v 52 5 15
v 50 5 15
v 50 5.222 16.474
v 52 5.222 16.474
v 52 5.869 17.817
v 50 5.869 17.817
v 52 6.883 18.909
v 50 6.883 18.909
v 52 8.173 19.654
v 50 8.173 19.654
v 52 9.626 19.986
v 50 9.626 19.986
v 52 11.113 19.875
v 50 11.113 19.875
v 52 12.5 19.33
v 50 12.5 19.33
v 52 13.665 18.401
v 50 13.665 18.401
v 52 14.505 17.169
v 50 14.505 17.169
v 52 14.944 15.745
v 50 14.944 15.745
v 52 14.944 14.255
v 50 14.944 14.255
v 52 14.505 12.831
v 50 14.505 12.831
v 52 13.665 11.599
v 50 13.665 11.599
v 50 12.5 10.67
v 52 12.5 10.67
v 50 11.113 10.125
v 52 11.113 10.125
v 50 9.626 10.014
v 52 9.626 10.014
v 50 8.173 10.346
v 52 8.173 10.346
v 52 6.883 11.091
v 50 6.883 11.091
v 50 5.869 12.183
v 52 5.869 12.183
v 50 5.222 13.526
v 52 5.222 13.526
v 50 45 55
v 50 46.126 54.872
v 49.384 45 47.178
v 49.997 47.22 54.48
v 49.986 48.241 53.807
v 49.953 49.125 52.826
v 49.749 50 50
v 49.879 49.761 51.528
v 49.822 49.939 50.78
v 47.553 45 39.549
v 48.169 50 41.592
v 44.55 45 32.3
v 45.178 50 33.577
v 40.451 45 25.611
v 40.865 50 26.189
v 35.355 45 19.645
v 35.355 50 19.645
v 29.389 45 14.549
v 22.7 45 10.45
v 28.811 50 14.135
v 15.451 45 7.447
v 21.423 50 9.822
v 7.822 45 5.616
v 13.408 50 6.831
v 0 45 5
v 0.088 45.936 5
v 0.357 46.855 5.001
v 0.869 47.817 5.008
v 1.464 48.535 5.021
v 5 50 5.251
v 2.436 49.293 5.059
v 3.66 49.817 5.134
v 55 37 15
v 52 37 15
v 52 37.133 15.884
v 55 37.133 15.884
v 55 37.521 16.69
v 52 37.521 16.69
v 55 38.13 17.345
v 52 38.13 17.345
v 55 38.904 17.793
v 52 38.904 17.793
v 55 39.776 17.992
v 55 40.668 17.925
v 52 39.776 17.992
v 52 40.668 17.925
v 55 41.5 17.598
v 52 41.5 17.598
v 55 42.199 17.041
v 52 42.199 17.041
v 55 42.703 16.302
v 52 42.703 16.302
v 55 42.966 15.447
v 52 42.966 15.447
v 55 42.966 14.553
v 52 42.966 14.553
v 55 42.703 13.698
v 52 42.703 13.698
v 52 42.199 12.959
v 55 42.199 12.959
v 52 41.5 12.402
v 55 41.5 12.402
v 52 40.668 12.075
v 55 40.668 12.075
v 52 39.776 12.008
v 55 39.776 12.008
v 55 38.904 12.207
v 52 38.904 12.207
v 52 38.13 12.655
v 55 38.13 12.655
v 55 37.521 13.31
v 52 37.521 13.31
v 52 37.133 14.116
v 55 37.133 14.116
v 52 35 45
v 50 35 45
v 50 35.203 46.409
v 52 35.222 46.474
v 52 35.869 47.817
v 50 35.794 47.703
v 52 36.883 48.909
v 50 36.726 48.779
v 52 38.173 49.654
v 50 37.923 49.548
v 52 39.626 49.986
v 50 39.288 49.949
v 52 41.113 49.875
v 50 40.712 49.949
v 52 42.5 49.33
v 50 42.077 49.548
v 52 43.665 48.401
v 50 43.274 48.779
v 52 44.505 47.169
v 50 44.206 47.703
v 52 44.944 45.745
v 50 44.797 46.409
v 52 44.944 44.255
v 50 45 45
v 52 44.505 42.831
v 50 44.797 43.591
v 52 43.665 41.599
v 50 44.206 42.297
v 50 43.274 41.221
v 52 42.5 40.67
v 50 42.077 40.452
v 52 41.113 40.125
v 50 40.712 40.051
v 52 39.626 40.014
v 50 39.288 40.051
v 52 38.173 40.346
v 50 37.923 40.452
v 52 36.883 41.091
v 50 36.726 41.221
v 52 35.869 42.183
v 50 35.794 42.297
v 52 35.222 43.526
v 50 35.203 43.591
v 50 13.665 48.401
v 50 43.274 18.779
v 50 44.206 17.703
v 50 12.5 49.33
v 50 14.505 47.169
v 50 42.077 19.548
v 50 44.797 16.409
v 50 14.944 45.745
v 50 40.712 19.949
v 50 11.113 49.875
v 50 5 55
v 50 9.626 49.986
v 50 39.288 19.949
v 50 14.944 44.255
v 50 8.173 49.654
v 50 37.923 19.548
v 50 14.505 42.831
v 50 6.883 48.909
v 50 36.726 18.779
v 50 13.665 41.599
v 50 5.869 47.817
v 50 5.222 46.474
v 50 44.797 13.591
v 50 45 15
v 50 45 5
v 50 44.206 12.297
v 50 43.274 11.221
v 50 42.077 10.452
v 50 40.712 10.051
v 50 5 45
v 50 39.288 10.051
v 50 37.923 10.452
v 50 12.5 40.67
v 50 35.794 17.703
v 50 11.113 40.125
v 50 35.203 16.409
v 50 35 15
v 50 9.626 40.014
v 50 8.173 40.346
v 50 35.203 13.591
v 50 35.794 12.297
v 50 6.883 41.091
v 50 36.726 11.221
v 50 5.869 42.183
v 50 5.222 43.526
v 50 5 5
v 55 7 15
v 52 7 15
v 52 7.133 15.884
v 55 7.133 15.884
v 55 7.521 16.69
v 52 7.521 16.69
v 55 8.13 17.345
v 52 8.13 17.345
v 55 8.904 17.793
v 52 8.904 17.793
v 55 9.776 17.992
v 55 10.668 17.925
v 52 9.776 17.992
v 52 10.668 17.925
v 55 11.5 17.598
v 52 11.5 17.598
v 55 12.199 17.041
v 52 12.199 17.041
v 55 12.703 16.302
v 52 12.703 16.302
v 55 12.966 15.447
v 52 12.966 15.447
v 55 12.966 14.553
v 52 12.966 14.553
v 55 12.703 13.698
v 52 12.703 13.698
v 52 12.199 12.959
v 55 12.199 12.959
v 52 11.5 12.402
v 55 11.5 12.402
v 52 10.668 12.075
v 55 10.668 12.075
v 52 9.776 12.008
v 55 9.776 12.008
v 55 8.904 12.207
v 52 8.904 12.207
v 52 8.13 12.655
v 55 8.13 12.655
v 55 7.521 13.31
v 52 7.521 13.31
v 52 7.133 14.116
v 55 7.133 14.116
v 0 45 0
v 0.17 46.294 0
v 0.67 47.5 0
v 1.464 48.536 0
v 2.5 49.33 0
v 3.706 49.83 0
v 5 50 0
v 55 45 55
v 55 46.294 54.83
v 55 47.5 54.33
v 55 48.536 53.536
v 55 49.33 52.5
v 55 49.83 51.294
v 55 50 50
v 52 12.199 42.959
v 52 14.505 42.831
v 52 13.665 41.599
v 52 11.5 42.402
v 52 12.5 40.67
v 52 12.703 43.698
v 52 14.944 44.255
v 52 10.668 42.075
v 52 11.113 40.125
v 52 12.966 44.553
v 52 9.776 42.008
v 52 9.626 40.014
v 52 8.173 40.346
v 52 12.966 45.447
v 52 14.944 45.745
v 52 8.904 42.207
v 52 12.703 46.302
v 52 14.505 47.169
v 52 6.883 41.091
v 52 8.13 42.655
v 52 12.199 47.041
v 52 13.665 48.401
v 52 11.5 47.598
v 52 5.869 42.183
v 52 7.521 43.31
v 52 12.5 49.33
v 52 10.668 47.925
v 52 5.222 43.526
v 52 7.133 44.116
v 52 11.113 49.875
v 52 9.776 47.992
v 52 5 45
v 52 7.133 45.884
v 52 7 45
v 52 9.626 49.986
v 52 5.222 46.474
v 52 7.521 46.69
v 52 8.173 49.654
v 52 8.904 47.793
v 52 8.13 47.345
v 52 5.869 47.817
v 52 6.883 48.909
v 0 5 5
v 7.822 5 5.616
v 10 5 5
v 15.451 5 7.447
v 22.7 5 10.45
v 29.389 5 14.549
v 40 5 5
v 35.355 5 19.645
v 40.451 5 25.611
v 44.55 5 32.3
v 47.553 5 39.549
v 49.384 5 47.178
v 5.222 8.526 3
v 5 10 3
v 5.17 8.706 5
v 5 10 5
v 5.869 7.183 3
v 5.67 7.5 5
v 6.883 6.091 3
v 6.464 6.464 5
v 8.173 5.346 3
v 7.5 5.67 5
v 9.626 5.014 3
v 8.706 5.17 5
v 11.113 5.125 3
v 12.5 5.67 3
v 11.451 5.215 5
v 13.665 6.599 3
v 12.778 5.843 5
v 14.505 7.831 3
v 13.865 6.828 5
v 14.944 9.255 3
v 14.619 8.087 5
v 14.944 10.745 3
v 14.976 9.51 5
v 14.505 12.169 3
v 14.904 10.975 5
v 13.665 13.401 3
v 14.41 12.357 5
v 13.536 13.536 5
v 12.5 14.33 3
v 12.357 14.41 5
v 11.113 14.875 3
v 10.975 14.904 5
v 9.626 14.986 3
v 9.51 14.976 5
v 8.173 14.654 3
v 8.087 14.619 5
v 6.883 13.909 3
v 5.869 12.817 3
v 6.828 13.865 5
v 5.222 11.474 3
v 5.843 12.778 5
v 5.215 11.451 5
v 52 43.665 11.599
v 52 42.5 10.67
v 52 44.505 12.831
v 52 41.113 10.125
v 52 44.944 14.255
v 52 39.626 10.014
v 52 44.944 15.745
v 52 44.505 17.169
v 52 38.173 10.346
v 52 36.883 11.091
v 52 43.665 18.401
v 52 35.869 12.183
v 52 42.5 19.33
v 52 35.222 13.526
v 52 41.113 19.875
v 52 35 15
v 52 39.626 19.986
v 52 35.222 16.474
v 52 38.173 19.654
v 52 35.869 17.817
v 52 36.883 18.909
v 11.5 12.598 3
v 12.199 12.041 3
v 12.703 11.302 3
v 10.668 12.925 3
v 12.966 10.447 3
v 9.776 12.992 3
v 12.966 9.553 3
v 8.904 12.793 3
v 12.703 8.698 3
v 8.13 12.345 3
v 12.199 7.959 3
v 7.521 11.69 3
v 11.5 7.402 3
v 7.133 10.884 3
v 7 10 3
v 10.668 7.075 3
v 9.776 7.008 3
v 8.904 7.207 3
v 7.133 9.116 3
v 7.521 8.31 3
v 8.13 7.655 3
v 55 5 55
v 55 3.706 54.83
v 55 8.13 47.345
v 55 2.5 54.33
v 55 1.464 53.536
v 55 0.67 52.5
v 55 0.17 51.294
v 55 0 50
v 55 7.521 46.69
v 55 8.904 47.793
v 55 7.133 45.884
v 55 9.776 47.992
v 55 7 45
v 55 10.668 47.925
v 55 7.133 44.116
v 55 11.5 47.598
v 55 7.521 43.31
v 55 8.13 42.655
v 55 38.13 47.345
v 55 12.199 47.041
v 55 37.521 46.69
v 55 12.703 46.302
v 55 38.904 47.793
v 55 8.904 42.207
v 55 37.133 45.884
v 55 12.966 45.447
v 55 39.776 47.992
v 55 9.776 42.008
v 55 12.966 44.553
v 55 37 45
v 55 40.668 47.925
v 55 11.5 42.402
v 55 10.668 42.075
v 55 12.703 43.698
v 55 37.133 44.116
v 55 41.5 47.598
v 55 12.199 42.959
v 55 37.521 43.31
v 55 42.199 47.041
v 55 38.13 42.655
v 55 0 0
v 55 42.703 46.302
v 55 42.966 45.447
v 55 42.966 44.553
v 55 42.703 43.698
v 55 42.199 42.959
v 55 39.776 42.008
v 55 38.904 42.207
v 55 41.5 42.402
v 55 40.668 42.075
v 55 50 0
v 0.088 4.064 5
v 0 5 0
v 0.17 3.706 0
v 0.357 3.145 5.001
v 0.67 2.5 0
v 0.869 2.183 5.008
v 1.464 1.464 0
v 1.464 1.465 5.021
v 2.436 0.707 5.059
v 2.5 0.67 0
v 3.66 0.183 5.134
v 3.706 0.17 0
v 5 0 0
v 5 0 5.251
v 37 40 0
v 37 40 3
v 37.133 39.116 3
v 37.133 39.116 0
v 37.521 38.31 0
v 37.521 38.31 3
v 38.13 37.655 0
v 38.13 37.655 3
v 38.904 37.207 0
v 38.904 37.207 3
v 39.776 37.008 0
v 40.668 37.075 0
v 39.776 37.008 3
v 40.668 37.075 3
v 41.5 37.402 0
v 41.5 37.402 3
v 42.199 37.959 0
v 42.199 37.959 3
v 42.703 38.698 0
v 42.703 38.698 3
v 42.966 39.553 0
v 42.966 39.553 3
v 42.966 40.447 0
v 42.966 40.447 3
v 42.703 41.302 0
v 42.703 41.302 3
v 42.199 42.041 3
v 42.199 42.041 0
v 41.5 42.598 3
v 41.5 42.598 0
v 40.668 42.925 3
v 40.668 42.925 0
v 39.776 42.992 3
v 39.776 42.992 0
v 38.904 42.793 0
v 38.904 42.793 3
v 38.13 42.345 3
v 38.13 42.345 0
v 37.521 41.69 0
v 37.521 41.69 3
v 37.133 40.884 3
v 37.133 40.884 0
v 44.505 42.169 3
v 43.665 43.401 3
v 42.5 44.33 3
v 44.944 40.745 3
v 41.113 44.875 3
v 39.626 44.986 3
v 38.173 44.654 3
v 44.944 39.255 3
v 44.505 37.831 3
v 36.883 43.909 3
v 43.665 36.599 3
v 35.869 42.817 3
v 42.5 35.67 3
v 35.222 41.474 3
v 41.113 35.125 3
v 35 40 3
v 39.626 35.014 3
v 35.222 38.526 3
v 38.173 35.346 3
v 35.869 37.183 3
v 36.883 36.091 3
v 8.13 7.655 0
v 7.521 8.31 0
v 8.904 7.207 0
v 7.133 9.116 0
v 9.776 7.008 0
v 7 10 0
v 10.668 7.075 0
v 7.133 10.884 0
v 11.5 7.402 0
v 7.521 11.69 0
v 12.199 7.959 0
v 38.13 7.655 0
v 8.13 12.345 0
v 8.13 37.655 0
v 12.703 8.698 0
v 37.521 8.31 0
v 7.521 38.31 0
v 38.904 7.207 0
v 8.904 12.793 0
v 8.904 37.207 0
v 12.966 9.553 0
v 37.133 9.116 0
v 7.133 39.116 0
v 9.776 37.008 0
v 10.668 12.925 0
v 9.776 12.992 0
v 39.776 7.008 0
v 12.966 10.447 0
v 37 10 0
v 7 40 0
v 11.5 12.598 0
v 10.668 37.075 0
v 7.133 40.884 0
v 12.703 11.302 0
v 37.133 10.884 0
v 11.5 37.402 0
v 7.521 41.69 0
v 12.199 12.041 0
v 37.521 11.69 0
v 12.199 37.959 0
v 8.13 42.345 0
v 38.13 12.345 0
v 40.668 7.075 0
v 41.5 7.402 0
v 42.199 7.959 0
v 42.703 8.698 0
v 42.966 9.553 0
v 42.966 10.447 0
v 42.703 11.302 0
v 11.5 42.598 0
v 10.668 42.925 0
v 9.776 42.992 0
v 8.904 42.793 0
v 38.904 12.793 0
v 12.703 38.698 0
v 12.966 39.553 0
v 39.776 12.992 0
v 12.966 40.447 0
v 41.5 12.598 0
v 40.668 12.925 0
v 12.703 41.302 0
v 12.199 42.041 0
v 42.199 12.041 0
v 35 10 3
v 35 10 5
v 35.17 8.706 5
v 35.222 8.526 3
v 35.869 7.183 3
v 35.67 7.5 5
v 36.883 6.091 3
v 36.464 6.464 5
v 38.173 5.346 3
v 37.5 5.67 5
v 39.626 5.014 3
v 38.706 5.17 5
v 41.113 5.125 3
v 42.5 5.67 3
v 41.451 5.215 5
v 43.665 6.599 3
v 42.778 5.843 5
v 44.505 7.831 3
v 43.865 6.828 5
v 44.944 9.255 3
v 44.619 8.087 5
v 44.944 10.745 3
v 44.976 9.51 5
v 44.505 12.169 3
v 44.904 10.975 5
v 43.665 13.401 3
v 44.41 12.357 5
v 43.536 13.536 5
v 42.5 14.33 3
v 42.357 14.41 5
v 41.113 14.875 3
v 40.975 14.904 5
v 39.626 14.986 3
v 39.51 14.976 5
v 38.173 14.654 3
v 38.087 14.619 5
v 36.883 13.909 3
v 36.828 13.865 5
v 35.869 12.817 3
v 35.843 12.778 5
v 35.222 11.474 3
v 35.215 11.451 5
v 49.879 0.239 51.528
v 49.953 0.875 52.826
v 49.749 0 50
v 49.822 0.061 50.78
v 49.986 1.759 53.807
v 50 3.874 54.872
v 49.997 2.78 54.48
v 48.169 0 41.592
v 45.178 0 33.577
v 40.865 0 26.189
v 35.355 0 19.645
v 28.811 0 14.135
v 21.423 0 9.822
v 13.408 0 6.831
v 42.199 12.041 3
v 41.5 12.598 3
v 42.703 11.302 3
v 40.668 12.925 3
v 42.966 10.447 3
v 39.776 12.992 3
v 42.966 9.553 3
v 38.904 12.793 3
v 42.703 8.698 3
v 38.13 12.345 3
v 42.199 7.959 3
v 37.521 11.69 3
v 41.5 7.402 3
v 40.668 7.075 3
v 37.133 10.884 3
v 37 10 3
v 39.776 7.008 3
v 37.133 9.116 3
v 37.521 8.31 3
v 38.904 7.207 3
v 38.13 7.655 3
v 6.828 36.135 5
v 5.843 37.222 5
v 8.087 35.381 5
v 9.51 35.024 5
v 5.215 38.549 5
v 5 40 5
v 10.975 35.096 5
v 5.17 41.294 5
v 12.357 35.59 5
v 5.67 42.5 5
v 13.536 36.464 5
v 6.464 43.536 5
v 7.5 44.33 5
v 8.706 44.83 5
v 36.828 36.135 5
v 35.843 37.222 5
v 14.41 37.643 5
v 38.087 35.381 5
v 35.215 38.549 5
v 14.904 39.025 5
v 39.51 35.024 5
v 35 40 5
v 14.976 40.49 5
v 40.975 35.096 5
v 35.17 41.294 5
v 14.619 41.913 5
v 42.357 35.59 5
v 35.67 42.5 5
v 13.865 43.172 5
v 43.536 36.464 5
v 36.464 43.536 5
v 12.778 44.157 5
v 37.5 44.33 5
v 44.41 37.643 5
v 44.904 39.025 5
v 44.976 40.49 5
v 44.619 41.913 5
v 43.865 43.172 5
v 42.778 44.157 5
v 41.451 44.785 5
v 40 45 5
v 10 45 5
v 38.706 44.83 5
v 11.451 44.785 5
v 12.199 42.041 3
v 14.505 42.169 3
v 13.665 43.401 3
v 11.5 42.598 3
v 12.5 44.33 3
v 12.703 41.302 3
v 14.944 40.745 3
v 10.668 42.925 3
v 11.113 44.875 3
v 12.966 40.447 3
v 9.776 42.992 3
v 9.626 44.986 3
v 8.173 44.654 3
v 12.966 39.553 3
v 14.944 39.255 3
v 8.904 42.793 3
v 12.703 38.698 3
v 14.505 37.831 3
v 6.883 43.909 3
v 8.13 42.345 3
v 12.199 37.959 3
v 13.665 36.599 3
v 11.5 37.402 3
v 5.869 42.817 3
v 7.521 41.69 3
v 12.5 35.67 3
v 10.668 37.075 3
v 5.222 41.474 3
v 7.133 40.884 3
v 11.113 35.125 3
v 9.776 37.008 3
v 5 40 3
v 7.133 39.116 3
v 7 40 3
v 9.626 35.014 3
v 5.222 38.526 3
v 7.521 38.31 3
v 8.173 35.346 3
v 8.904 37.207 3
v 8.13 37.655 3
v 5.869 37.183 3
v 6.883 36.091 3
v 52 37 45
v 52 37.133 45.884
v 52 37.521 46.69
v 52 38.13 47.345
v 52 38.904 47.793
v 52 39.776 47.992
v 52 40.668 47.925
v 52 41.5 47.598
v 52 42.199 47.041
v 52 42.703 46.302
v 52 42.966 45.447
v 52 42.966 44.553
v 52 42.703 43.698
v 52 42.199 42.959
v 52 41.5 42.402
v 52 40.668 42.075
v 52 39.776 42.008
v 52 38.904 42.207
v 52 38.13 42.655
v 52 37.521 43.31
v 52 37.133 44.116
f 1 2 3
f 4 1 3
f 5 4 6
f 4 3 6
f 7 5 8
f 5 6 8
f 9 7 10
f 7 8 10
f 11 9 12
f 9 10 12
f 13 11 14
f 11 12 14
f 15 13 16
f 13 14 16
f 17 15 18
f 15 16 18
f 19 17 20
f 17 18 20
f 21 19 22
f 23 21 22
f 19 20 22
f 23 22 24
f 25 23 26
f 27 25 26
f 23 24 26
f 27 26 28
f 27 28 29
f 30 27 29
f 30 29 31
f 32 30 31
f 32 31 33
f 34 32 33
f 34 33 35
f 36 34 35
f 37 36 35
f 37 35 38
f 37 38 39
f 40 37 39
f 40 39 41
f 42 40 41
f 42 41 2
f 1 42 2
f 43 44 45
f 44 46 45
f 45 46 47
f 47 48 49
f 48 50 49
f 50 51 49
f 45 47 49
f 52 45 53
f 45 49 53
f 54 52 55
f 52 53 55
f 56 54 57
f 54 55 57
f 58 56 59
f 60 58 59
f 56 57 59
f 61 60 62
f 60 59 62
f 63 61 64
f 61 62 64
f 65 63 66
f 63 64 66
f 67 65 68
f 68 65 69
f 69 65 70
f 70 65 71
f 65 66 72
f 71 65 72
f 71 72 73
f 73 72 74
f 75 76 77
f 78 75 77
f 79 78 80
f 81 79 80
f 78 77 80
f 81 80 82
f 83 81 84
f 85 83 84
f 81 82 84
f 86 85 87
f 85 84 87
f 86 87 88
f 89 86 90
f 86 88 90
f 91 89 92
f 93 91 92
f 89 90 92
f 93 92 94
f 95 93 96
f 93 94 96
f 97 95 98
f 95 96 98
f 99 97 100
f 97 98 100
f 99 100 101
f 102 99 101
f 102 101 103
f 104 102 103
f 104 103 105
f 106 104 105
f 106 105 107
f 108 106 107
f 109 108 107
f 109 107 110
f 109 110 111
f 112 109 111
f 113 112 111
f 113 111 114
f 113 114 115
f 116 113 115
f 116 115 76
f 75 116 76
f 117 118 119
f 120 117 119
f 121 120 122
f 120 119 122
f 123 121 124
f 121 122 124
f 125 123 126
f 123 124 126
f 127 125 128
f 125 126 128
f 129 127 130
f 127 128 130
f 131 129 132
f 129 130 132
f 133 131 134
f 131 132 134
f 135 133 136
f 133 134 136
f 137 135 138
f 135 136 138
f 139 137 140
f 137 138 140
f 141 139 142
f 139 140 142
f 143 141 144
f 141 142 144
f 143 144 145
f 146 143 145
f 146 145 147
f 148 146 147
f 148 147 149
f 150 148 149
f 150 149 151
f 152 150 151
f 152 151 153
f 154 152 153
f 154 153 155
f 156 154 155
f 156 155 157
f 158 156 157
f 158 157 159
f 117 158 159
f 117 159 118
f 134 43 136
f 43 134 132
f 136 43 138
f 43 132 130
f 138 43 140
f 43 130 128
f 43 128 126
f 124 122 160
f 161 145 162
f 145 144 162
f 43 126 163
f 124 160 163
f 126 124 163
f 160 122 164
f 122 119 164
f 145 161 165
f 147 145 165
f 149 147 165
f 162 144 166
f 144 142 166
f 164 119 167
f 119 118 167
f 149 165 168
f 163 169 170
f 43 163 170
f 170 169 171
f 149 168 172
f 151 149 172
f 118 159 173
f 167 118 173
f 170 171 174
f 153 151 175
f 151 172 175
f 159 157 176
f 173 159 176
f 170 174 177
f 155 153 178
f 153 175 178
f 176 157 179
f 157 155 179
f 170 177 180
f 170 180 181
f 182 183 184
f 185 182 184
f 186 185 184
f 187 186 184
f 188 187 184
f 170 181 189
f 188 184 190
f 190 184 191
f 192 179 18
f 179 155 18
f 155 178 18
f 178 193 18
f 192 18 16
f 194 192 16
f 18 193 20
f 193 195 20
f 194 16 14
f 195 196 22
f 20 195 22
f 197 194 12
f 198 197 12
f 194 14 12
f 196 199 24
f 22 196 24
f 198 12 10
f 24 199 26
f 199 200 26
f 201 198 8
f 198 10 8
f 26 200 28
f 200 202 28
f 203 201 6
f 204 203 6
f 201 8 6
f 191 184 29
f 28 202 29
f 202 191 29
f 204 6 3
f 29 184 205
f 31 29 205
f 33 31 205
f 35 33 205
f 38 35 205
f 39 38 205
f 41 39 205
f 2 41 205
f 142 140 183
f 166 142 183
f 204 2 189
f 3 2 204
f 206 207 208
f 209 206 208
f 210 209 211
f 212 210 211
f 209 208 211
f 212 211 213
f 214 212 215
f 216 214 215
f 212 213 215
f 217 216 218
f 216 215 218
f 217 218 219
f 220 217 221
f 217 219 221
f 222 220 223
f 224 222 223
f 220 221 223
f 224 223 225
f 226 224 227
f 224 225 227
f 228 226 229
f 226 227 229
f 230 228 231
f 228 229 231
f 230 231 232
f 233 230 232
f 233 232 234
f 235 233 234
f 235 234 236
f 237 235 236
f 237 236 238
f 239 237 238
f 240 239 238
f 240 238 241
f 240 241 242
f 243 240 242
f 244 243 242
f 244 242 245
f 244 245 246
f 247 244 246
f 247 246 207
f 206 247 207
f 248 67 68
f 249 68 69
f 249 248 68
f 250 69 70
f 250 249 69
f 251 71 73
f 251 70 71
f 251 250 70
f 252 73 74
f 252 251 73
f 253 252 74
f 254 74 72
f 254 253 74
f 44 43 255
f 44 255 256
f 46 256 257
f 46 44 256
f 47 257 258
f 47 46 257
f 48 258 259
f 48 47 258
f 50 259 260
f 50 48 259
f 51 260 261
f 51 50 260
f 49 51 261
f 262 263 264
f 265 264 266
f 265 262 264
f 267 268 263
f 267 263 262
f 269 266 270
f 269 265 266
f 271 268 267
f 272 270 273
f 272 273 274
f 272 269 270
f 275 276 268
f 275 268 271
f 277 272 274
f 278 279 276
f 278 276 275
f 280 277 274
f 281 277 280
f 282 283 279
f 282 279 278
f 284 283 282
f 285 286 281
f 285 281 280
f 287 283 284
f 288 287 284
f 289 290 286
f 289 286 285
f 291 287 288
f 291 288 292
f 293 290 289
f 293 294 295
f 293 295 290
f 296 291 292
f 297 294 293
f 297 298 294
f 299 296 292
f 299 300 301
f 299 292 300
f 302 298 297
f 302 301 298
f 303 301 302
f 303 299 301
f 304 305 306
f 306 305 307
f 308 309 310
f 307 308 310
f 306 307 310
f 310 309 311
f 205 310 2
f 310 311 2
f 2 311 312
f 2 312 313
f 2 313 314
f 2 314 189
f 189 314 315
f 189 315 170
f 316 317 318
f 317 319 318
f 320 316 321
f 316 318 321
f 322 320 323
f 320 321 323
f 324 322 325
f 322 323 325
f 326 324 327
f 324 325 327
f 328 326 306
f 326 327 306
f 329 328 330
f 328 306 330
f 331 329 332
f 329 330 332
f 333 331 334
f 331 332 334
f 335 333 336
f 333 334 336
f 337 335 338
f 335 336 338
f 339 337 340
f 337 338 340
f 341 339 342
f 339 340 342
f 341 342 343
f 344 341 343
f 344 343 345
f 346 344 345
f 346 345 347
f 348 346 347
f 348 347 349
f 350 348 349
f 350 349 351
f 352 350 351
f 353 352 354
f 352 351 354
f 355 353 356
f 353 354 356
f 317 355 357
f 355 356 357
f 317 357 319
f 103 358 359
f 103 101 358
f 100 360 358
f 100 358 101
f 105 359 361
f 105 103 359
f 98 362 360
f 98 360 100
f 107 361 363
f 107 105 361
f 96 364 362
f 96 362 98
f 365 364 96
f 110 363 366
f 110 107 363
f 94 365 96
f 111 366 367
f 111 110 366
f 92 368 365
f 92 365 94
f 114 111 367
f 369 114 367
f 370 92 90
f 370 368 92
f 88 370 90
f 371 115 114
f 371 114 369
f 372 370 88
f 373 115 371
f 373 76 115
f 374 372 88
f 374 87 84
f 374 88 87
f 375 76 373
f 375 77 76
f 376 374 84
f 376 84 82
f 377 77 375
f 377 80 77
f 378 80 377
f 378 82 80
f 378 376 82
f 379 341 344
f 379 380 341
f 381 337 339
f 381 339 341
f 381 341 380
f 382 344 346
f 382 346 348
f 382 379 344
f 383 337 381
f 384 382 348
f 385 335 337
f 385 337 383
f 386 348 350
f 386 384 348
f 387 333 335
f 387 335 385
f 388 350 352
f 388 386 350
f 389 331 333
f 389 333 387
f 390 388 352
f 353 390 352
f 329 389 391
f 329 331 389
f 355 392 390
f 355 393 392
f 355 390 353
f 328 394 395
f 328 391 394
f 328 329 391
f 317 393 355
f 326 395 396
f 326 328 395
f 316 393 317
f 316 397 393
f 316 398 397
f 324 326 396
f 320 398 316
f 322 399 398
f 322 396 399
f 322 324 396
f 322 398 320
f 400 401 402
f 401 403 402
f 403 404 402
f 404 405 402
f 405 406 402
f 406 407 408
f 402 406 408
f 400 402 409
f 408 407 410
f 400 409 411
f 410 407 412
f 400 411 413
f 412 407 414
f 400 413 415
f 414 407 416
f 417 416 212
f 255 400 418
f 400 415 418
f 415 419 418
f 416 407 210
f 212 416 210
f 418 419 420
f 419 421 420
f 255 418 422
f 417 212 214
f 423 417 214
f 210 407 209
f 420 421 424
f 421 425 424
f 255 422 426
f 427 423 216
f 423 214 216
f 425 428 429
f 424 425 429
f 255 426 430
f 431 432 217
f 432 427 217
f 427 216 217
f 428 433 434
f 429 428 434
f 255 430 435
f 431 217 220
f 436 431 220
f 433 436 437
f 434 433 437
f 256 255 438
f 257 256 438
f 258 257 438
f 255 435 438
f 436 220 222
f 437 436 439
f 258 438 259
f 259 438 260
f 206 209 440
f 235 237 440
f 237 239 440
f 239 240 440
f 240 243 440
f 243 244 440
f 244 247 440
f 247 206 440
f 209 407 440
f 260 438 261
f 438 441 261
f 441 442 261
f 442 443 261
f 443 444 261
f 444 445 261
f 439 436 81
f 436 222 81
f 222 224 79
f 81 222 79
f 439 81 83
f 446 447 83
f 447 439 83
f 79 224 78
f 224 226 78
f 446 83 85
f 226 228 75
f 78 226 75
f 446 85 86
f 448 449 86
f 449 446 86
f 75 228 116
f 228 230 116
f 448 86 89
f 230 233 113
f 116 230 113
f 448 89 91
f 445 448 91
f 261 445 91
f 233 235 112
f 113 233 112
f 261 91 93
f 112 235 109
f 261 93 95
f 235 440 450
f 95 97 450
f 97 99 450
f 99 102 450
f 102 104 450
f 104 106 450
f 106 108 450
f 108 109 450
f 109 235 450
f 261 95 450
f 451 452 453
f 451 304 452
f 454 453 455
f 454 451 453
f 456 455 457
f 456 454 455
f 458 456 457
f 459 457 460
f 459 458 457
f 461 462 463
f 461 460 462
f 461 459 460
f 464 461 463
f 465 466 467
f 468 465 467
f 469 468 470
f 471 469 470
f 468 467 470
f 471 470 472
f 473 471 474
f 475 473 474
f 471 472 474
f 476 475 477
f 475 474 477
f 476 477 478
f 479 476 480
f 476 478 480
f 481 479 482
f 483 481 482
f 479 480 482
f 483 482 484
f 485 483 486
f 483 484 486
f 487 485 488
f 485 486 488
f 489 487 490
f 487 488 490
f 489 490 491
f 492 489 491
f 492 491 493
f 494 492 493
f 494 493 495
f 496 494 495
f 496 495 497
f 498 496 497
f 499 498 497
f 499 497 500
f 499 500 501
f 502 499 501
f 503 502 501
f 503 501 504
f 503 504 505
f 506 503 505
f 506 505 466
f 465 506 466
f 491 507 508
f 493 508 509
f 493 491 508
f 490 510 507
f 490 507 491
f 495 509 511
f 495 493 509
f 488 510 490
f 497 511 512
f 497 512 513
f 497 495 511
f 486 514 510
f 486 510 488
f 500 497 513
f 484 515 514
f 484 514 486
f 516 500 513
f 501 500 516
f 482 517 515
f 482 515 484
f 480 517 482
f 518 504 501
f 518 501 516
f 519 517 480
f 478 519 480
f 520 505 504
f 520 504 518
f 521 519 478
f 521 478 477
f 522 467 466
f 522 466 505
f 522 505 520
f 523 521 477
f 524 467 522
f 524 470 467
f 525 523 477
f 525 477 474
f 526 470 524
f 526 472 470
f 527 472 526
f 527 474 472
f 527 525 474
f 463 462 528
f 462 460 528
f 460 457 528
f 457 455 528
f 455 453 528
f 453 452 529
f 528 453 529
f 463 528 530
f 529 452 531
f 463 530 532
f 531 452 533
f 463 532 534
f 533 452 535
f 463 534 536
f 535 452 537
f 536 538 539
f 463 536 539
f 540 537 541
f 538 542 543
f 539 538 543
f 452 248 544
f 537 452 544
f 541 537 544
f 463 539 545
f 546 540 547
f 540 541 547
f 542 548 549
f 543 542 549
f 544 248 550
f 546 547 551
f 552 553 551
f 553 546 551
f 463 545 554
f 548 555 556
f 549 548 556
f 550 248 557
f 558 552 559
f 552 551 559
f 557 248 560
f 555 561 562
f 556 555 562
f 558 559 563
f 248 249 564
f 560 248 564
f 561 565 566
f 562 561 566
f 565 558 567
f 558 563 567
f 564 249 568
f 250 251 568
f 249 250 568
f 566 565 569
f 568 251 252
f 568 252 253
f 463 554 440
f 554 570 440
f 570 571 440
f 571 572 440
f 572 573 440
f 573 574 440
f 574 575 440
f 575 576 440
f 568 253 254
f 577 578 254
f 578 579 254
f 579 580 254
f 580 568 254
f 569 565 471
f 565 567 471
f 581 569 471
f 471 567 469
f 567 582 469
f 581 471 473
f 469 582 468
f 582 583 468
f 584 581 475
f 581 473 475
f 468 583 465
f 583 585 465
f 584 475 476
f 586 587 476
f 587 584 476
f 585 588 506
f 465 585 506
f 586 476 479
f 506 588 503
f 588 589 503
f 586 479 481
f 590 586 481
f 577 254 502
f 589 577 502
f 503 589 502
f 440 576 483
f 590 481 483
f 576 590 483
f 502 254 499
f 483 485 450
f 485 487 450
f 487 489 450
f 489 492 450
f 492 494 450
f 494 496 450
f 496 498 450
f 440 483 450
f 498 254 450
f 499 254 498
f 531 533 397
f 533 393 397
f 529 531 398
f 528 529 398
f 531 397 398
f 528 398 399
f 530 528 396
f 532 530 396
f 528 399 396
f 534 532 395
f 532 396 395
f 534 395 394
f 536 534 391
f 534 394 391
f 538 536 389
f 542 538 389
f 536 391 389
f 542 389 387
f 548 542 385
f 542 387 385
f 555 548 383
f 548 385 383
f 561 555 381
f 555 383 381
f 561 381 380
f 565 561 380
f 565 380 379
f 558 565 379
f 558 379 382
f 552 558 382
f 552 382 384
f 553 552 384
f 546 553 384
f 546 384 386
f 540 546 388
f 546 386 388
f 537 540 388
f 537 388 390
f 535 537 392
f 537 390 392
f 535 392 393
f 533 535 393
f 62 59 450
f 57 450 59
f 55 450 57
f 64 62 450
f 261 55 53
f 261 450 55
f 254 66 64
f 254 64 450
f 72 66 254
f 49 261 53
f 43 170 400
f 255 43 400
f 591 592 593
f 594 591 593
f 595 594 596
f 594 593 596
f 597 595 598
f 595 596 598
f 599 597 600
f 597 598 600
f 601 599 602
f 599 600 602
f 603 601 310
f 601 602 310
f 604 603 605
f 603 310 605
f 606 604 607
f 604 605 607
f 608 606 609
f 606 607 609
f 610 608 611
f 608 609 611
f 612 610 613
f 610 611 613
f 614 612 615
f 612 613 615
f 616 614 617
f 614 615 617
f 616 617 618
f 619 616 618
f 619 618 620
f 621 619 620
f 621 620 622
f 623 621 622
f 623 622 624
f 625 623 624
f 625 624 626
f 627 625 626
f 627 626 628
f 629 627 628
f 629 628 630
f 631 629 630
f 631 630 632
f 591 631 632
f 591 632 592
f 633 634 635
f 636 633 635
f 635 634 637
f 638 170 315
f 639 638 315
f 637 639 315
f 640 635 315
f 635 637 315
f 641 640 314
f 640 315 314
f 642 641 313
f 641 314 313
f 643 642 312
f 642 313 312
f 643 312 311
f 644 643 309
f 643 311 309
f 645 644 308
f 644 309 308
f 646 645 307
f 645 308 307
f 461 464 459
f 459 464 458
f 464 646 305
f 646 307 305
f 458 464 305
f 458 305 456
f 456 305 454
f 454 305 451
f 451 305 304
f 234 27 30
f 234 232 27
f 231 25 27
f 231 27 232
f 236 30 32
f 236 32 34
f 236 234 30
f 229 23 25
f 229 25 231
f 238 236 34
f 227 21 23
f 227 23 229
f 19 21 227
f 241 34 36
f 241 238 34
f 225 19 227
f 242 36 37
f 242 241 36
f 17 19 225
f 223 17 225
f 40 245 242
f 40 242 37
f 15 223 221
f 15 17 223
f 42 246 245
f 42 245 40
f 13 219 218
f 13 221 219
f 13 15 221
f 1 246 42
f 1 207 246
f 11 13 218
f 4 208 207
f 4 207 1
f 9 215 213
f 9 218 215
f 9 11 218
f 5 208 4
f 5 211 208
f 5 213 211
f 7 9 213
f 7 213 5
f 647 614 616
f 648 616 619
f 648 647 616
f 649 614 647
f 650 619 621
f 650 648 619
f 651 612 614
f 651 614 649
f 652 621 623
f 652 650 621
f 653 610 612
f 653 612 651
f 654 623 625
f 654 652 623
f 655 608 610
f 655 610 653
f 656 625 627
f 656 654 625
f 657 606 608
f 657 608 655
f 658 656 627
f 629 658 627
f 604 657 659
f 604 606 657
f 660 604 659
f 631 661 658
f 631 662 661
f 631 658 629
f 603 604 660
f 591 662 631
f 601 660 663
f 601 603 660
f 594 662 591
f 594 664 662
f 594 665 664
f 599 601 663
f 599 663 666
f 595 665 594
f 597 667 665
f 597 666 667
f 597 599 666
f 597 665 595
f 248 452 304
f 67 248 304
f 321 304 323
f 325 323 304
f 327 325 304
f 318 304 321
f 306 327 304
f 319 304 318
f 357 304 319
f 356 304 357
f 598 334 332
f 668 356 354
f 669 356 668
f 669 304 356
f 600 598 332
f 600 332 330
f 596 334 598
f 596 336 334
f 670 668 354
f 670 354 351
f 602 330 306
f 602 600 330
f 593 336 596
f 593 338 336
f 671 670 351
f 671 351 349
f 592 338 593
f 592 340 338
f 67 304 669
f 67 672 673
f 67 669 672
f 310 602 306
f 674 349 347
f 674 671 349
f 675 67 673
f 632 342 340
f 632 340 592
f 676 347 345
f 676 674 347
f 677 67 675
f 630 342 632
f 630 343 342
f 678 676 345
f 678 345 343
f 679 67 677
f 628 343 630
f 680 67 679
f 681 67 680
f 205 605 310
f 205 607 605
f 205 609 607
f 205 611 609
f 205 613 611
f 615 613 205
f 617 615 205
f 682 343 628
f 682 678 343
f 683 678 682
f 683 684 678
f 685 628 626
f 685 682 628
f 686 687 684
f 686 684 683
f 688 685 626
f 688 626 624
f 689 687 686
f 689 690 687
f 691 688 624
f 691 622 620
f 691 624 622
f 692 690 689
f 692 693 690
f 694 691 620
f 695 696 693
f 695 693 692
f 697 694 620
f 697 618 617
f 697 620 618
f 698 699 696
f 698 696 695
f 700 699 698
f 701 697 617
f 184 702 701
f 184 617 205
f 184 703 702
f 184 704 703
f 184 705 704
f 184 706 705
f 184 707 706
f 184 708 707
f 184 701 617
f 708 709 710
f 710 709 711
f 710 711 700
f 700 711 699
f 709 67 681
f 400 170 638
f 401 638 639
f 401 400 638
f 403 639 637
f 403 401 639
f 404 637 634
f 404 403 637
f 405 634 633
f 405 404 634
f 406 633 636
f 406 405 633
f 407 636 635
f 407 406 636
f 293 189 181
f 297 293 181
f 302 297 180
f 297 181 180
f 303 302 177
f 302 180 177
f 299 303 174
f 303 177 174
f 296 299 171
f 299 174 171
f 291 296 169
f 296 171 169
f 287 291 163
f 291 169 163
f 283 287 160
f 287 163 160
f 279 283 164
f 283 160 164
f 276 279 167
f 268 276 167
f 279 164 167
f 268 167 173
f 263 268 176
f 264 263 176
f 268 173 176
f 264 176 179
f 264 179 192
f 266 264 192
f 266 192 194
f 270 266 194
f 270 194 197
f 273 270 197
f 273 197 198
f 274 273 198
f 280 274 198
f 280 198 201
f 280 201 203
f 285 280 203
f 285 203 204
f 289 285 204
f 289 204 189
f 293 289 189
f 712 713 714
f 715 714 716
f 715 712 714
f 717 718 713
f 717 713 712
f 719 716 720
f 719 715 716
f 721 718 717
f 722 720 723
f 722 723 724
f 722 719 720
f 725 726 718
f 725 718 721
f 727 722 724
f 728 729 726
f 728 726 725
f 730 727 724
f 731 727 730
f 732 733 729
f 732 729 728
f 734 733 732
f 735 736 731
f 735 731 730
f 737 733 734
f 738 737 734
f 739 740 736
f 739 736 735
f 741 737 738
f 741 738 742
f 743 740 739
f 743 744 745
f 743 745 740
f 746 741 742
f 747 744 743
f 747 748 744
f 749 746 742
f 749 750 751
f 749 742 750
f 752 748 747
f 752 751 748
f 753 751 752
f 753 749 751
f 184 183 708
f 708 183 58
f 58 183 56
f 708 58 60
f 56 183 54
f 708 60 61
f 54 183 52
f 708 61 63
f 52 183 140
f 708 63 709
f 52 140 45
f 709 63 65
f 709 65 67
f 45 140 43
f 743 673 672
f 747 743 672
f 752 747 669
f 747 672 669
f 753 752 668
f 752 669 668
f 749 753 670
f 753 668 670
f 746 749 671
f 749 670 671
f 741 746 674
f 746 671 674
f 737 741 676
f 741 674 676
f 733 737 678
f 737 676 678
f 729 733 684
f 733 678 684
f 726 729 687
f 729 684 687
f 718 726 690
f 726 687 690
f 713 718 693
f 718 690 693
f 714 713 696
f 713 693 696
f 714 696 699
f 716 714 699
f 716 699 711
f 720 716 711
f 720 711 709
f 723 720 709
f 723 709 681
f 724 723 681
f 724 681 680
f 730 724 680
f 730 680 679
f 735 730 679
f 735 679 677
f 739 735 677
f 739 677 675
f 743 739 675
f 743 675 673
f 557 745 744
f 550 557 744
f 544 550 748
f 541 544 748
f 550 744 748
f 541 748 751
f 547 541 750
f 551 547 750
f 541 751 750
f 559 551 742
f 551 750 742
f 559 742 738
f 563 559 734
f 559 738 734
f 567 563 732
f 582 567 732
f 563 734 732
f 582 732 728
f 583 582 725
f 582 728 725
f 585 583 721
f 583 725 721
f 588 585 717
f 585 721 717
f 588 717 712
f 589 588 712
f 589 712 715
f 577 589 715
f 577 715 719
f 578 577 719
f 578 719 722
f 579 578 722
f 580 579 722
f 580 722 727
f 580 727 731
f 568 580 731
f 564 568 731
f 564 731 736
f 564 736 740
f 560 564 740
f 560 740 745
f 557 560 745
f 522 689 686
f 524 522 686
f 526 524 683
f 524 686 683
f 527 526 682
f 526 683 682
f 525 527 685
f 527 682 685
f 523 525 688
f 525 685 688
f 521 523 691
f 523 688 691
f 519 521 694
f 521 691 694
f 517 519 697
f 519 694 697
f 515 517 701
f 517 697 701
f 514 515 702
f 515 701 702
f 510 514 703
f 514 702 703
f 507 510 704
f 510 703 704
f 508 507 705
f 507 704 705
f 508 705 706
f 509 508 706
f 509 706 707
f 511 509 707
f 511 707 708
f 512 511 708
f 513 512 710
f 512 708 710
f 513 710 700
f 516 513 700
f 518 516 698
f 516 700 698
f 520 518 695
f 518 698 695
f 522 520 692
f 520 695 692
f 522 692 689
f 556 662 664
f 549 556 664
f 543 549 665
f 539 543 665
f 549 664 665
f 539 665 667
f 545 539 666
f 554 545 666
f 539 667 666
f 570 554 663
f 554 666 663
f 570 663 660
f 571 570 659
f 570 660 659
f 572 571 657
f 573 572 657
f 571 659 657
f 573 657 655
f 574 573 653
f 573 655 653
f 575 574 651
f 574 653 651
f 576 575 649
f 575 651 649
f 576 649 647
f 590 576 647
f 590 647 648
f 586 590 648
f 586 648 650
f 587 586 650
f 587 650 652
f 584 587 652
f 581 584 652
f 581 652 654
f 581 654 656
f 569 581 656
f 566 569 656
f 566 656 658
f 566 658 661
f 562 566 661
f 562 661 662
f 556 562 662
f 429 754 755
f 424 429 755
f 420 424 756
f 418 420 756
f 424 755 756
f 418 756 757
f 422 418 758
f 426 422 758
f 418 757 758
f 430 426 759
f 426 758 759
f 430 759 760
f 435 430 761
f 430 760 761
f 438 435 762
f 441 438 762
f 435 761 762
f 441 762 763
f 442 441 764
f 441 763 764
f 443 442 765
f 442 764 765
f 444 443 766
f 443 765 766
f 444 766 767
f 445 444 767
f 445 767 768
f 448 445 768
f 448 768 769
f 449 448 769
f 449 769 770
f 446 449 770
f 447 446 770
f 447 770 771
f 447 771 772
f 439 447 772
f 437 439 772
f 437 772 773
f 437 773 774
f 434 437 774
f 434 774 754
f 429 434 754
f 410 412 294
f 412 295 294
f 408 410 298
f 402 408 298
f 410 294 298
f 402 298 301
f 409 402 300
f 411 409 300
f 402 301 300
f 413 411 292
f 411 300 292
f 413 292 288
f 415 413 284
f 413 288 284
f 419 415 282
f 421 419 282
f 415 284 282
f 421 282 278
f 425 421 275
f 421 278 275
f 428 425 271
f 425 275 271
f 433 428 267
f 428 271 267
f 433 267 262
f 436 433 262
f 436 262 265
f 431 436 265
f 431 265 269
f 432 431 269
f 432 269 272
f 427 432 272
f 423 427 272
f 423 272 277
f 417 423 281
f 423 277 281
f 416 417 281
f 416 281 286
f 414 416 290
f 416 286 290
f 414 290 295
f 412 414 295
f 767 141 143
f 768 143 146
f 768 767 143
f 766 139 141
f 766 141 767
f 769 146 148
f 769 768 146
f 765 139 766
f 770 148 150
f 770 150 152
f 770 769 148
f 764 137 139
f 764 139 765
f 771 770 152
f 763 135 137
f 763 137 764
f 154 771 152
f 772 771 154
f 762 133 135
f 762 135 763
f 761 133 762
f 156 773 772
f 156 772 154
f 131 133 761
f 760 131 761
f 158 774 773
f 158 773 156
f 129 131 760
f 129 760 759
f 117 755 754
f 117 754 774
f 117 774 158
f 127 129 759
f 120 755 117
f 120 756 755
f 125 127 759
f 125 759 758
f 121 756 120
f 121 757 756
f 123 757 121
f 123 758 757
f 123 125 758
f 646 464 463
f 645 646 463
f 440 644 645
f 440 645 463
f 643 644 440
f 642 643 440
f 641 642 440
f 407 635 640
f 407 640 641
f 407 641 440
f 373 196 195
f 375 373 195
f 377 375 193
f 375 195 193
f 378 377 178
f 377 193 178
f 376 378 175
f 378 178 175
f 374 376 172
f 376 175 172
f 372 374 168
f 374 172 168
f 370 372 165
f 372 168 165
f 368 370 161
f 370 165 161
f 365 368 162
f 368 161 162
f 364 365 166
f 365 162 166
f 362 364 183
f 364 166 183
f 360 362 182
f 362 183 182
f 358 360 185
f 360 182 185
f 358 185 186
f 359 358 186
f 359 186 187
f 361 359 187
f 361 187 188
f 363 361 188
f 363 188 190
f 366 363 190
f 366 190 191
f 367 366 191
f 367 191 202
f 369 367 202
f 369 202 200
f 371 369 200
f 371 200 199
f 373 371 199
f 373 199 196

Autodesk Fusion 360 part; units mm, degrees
sketch "Sketch1" plane through (0, 0, 0) normal (0, 0, 1) x (1, 0, 0)
  line L0 (0, 0) -> (55, 0)
  line L1 (55, 0) -> (55, 50)
  line L2 (55, 50) -> (0, 50)
  line L3 (0, 50) -> (0, 0)
  dimension "d1" = 55
  dimension "d2" = 50
extrude "Extrude1" add sketch "Sketch1" along normal blind 5
sketch "Sketch2" plane through (0, 0, 5) normal (0, 0, 1) x (-1, 0, 0)
  line L0 (0, -50) -> (0, 0)
  line L1 (0, 0) -> (-55, 0)
  line L2 (-55, 0) -> (-55, -50)
  line L3 (-55, -50) -> (0, -50)
  circle A0 centre (-10, -40) radius 3
  circle A1 centre (-10, -10) radius 3
  circle A2 centre (-40, -10) radius 3
  circle A3 centre (-40, -40) radius 3
  dimension "d5" = 6
  dimension "d6" = 6
  dimension "d7" = 6
  dimension "d8" = 6
extrude "Extrude2" cut sketch "Sketch2" against normal blind 5 contours A0 | A1 | A2 | A3
sketch "Sketch3" plane through (0, 0, 5) normal (0, 0, 1) x (-1, 0, 0)
  circle A0 centre (-40, -40) radius 3
  circle A1 centre (-40, -10) radius 3
  circle A2 centre (-10, -40) radius 3
  circle A3 centre (-10, -10) radius 3
  line L0 (0, -50) -> (0, 0)
  line L1 (0, 0) -> (-55, 0)
  line L2 (-55, 0) -> (-55, -50)
  line L3 (-55, -50) -> (0, -50)
  circle A4 centre (-10, -10) radius 5
  circle A5 centre (-10, -40) radius 5
  circle A6 centre (-40, -40) radius 5
  circle A7 centre (-40, -10) radius 5
  dimension "d11" = 10
  dimension "d12" = 10
  dimension "d13" = 10
  dimension "d14" = 10
extrude "Extrude3" cut sketch "Sketch3" against normal blind 2 contours A4 | A5 | A6 | A7
sketch "Sketch4" plane through (0, 0, 5) normal (0, 0, 1) x (-1, 0, 0)
  circle A0 centre (-40, -40) radius 5
  circle A1 centre (-40, -10) radius 5
  circle A2 centre (-10, -40) radius 5
  circle A3 centre (-10, -10) radius 5
  line L0 (0, -50) -> (0, 0)
  line L1 (0, 0) -> (-55, 0)
  line L2 (-55, 0) -> (-55, -50)
  line L3 (-55, -50) -> (0, -50)
  line L4 (-50, 0) -> (-55, 0)
  line L5 (-55, 0) -> (-55, -50)
  line L6 (-55, -50) -> (-50, -50)
  line L7 (-50, -50) -> (-50, 0)
  dimension "d17" = 5
  dimension "d18" = 50
extrude "Extrude4" add sketch "Sketch4" along normal blind 50 contours L1 L2 L3 L4 L5 L6 L7
sketch "Sketch5" plane through (50, 0, 0) normal (-1, 0, 0) x (0, -1, 0)
  line L0 (-50, 5) -> (0, 5)
  line L1 (0, 5) -> (0, 55)
  line L2 (0, 55) -> (-50, 55)
  line L3 (-50, 55) -> (-50, 5)
  circle A0 centre (-40, 45) radius 3
  circle A1 centre (-10, 45) radius 3
  circle A2 centre (-10, 15) radius 3
  circle A3 centre (-40, 15) radius 3
  dimension "d21" = 6
  dimension "d22" = 6
  dimension "d23" = 6
  dimension "d24" = 6
extrude "Extrude5" cut sketch "Sketch5" against normal blind 5 contours A0 | A1 | A2 | A3
sketch "Sketch6" plane through (50, 0, 0) normal (-1, 0, 0) x (0, -1, 0)
  circle A0 centre (-10, 45) radius 3
  circle A1 centre (-10, 15) radius 3
  circle A2 centre (-40, 45) radius 3
  circle A3 centre (-40, 15) radius 3
  line L0 (-50, 5) -> (0, 5)
  line L1 (0, 5) -> (0, 55)
  line L2 (0, 55) -> (-50, 55)
  line L3 (-50, 55) -> (-50, 5)
  circle A4 centre (-40, 45) radius 5
  circle A5 centre (-10, 45) radius 5
  circle A6 centre (-40, 15) radius 5
  circle A7 centre (-10, 15) radius 5
  dimension "d27" = 10
  dimension "d28" = 10
  dimension "d29" = 10
  dimension "d30" = 10
extrude "Extrude6" cut sketch "Sketch6" against normal blind 2 contours A4 | A5 | A6 | A7
sketch "Sketch7" plane through (0, 0, 0) normal (0, -1, 0) x (1, 0, 0)
  line L0 (0, 0) -> (55, 0)
  line L1 (55, 0) -> (55, 55)
  line L2 (55, 55) -> (50, 55)
  line L3 (50, 55) -> (50, 5)
  line L4 (50, 5) -> (0, 5)
  line L5 (0, 5) -> (0, 0)
  line L6 (55, 0) -> (0, 0)
  line L7 (0, 0) -> (0, 55)
  line L8 (0, 55) -> (55, 55)
  line L9 (55, 55) -> (55, 0)
extrude "Extrude7" add sketch "Sketch7" against normal blind 5 contours L3 L4 L7 L8
sketch "Sketch8" plane through (0, 50, 0) normal (0, 1, 0) x (-1, 0, 0)
  line L0 (-55, 0) -> (0, 0)
  line L1 (0, 0) -> (0, 5)
  line L2 (0, 5) -> (-50, 5)
  line L3 (-50, 5) -> (-50, 55)
  line L4 (-50, 55) -> (-55, 55)
  line L5 (-55, 55) -> (-55, 0)
  line L6 (0, 55) -> (-55, 55)
  line L7 (-55, 55) -> (-55, 0)
  line L8 (-55, 0) -> (0, 0)
  line L9 (0, 0) -> (0, 55)
extrude "Extrude8" add sketch "Sketch8" against normal blind 5 contours L2 L3 L6 L9
sketch "Sketch9" plane through (0, 50, 0) normal (0, 1, 0) x (-1, 0, 0)
  line L0 (-55, 0) -> (0, 0)
  line L1 (0, 0) -> (0, 55)
  line L2 (0, 55) -> (-55, 55)
  line L3 (-55, 55) -> (-55, 0)
  circle A0 centre (0, 55) radius 50
extrude "Extrude9" cut sketch "Sketch9" against normal blind 50 contours L1 L2 A0 | L1 L2 A0
fillet "Fillet1" radius 5 4 edges at (0, 0, 2.5) (52.5, 0, 55) (52.5, 50, 55) (0, 50, 2.5)
